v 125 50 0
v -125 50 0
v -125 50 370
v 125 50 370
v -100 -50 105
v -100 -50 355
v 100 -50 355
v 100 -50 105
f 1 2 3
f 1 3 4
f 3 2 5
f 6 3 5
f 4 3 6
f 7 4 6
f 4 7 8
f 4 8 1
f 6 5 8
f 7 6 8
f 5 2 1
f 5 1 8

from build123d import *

# Parameters (mm, degrees)
SKETCH_1_W          = 250
SKETCH_1_H          = 100
EXTRUDE_1_DEPTH     = 370
CUT_EXTRUDE_1_DEPTH = 370
CUT_EXTRUDE_3_DEPTH = 458.602447546


with BuildPart() as part:
    # 草圖1 → 填料-伸長1 (new body)
    with BuildSketch(Plane.XY):
        Rectangle(SKETCH_1_W, SKETCH_1_H)
    extrude(amount=EXTRUDE_1_DEPTH)

    # 草圖2 → 除料-伸長1 (cut)
    with BuildSketch(Plane.XY.offset(370)):
        Polygon((-125, 50), (-100, -50), (-125, -50), align=None)
        Polygon((125, 50), (125, -50), (100, -50), align=None)
    extrude(amount=-CUT_EXTRUDE_1_DEPTH, mode=Mode.SUBTRACT)

    # 草圖7 → 除料-伸長3 (cut, through all)
    with BuildSketch(Plane(origin=(-125, 50, 370), x_dir=(0, 0, 1), z_dir=(-1, 0, 0))):
        Polygon((0, 0), (-15, -100), (0, -100), align=None)
        Polygon((-370, 0), (-265, -100), (-370, -100), align=None)
    extrude(amount=-CUT_EXTRUDE_3_DEPTH, mode=Mode.SUBTRACT)


solid = part.part
